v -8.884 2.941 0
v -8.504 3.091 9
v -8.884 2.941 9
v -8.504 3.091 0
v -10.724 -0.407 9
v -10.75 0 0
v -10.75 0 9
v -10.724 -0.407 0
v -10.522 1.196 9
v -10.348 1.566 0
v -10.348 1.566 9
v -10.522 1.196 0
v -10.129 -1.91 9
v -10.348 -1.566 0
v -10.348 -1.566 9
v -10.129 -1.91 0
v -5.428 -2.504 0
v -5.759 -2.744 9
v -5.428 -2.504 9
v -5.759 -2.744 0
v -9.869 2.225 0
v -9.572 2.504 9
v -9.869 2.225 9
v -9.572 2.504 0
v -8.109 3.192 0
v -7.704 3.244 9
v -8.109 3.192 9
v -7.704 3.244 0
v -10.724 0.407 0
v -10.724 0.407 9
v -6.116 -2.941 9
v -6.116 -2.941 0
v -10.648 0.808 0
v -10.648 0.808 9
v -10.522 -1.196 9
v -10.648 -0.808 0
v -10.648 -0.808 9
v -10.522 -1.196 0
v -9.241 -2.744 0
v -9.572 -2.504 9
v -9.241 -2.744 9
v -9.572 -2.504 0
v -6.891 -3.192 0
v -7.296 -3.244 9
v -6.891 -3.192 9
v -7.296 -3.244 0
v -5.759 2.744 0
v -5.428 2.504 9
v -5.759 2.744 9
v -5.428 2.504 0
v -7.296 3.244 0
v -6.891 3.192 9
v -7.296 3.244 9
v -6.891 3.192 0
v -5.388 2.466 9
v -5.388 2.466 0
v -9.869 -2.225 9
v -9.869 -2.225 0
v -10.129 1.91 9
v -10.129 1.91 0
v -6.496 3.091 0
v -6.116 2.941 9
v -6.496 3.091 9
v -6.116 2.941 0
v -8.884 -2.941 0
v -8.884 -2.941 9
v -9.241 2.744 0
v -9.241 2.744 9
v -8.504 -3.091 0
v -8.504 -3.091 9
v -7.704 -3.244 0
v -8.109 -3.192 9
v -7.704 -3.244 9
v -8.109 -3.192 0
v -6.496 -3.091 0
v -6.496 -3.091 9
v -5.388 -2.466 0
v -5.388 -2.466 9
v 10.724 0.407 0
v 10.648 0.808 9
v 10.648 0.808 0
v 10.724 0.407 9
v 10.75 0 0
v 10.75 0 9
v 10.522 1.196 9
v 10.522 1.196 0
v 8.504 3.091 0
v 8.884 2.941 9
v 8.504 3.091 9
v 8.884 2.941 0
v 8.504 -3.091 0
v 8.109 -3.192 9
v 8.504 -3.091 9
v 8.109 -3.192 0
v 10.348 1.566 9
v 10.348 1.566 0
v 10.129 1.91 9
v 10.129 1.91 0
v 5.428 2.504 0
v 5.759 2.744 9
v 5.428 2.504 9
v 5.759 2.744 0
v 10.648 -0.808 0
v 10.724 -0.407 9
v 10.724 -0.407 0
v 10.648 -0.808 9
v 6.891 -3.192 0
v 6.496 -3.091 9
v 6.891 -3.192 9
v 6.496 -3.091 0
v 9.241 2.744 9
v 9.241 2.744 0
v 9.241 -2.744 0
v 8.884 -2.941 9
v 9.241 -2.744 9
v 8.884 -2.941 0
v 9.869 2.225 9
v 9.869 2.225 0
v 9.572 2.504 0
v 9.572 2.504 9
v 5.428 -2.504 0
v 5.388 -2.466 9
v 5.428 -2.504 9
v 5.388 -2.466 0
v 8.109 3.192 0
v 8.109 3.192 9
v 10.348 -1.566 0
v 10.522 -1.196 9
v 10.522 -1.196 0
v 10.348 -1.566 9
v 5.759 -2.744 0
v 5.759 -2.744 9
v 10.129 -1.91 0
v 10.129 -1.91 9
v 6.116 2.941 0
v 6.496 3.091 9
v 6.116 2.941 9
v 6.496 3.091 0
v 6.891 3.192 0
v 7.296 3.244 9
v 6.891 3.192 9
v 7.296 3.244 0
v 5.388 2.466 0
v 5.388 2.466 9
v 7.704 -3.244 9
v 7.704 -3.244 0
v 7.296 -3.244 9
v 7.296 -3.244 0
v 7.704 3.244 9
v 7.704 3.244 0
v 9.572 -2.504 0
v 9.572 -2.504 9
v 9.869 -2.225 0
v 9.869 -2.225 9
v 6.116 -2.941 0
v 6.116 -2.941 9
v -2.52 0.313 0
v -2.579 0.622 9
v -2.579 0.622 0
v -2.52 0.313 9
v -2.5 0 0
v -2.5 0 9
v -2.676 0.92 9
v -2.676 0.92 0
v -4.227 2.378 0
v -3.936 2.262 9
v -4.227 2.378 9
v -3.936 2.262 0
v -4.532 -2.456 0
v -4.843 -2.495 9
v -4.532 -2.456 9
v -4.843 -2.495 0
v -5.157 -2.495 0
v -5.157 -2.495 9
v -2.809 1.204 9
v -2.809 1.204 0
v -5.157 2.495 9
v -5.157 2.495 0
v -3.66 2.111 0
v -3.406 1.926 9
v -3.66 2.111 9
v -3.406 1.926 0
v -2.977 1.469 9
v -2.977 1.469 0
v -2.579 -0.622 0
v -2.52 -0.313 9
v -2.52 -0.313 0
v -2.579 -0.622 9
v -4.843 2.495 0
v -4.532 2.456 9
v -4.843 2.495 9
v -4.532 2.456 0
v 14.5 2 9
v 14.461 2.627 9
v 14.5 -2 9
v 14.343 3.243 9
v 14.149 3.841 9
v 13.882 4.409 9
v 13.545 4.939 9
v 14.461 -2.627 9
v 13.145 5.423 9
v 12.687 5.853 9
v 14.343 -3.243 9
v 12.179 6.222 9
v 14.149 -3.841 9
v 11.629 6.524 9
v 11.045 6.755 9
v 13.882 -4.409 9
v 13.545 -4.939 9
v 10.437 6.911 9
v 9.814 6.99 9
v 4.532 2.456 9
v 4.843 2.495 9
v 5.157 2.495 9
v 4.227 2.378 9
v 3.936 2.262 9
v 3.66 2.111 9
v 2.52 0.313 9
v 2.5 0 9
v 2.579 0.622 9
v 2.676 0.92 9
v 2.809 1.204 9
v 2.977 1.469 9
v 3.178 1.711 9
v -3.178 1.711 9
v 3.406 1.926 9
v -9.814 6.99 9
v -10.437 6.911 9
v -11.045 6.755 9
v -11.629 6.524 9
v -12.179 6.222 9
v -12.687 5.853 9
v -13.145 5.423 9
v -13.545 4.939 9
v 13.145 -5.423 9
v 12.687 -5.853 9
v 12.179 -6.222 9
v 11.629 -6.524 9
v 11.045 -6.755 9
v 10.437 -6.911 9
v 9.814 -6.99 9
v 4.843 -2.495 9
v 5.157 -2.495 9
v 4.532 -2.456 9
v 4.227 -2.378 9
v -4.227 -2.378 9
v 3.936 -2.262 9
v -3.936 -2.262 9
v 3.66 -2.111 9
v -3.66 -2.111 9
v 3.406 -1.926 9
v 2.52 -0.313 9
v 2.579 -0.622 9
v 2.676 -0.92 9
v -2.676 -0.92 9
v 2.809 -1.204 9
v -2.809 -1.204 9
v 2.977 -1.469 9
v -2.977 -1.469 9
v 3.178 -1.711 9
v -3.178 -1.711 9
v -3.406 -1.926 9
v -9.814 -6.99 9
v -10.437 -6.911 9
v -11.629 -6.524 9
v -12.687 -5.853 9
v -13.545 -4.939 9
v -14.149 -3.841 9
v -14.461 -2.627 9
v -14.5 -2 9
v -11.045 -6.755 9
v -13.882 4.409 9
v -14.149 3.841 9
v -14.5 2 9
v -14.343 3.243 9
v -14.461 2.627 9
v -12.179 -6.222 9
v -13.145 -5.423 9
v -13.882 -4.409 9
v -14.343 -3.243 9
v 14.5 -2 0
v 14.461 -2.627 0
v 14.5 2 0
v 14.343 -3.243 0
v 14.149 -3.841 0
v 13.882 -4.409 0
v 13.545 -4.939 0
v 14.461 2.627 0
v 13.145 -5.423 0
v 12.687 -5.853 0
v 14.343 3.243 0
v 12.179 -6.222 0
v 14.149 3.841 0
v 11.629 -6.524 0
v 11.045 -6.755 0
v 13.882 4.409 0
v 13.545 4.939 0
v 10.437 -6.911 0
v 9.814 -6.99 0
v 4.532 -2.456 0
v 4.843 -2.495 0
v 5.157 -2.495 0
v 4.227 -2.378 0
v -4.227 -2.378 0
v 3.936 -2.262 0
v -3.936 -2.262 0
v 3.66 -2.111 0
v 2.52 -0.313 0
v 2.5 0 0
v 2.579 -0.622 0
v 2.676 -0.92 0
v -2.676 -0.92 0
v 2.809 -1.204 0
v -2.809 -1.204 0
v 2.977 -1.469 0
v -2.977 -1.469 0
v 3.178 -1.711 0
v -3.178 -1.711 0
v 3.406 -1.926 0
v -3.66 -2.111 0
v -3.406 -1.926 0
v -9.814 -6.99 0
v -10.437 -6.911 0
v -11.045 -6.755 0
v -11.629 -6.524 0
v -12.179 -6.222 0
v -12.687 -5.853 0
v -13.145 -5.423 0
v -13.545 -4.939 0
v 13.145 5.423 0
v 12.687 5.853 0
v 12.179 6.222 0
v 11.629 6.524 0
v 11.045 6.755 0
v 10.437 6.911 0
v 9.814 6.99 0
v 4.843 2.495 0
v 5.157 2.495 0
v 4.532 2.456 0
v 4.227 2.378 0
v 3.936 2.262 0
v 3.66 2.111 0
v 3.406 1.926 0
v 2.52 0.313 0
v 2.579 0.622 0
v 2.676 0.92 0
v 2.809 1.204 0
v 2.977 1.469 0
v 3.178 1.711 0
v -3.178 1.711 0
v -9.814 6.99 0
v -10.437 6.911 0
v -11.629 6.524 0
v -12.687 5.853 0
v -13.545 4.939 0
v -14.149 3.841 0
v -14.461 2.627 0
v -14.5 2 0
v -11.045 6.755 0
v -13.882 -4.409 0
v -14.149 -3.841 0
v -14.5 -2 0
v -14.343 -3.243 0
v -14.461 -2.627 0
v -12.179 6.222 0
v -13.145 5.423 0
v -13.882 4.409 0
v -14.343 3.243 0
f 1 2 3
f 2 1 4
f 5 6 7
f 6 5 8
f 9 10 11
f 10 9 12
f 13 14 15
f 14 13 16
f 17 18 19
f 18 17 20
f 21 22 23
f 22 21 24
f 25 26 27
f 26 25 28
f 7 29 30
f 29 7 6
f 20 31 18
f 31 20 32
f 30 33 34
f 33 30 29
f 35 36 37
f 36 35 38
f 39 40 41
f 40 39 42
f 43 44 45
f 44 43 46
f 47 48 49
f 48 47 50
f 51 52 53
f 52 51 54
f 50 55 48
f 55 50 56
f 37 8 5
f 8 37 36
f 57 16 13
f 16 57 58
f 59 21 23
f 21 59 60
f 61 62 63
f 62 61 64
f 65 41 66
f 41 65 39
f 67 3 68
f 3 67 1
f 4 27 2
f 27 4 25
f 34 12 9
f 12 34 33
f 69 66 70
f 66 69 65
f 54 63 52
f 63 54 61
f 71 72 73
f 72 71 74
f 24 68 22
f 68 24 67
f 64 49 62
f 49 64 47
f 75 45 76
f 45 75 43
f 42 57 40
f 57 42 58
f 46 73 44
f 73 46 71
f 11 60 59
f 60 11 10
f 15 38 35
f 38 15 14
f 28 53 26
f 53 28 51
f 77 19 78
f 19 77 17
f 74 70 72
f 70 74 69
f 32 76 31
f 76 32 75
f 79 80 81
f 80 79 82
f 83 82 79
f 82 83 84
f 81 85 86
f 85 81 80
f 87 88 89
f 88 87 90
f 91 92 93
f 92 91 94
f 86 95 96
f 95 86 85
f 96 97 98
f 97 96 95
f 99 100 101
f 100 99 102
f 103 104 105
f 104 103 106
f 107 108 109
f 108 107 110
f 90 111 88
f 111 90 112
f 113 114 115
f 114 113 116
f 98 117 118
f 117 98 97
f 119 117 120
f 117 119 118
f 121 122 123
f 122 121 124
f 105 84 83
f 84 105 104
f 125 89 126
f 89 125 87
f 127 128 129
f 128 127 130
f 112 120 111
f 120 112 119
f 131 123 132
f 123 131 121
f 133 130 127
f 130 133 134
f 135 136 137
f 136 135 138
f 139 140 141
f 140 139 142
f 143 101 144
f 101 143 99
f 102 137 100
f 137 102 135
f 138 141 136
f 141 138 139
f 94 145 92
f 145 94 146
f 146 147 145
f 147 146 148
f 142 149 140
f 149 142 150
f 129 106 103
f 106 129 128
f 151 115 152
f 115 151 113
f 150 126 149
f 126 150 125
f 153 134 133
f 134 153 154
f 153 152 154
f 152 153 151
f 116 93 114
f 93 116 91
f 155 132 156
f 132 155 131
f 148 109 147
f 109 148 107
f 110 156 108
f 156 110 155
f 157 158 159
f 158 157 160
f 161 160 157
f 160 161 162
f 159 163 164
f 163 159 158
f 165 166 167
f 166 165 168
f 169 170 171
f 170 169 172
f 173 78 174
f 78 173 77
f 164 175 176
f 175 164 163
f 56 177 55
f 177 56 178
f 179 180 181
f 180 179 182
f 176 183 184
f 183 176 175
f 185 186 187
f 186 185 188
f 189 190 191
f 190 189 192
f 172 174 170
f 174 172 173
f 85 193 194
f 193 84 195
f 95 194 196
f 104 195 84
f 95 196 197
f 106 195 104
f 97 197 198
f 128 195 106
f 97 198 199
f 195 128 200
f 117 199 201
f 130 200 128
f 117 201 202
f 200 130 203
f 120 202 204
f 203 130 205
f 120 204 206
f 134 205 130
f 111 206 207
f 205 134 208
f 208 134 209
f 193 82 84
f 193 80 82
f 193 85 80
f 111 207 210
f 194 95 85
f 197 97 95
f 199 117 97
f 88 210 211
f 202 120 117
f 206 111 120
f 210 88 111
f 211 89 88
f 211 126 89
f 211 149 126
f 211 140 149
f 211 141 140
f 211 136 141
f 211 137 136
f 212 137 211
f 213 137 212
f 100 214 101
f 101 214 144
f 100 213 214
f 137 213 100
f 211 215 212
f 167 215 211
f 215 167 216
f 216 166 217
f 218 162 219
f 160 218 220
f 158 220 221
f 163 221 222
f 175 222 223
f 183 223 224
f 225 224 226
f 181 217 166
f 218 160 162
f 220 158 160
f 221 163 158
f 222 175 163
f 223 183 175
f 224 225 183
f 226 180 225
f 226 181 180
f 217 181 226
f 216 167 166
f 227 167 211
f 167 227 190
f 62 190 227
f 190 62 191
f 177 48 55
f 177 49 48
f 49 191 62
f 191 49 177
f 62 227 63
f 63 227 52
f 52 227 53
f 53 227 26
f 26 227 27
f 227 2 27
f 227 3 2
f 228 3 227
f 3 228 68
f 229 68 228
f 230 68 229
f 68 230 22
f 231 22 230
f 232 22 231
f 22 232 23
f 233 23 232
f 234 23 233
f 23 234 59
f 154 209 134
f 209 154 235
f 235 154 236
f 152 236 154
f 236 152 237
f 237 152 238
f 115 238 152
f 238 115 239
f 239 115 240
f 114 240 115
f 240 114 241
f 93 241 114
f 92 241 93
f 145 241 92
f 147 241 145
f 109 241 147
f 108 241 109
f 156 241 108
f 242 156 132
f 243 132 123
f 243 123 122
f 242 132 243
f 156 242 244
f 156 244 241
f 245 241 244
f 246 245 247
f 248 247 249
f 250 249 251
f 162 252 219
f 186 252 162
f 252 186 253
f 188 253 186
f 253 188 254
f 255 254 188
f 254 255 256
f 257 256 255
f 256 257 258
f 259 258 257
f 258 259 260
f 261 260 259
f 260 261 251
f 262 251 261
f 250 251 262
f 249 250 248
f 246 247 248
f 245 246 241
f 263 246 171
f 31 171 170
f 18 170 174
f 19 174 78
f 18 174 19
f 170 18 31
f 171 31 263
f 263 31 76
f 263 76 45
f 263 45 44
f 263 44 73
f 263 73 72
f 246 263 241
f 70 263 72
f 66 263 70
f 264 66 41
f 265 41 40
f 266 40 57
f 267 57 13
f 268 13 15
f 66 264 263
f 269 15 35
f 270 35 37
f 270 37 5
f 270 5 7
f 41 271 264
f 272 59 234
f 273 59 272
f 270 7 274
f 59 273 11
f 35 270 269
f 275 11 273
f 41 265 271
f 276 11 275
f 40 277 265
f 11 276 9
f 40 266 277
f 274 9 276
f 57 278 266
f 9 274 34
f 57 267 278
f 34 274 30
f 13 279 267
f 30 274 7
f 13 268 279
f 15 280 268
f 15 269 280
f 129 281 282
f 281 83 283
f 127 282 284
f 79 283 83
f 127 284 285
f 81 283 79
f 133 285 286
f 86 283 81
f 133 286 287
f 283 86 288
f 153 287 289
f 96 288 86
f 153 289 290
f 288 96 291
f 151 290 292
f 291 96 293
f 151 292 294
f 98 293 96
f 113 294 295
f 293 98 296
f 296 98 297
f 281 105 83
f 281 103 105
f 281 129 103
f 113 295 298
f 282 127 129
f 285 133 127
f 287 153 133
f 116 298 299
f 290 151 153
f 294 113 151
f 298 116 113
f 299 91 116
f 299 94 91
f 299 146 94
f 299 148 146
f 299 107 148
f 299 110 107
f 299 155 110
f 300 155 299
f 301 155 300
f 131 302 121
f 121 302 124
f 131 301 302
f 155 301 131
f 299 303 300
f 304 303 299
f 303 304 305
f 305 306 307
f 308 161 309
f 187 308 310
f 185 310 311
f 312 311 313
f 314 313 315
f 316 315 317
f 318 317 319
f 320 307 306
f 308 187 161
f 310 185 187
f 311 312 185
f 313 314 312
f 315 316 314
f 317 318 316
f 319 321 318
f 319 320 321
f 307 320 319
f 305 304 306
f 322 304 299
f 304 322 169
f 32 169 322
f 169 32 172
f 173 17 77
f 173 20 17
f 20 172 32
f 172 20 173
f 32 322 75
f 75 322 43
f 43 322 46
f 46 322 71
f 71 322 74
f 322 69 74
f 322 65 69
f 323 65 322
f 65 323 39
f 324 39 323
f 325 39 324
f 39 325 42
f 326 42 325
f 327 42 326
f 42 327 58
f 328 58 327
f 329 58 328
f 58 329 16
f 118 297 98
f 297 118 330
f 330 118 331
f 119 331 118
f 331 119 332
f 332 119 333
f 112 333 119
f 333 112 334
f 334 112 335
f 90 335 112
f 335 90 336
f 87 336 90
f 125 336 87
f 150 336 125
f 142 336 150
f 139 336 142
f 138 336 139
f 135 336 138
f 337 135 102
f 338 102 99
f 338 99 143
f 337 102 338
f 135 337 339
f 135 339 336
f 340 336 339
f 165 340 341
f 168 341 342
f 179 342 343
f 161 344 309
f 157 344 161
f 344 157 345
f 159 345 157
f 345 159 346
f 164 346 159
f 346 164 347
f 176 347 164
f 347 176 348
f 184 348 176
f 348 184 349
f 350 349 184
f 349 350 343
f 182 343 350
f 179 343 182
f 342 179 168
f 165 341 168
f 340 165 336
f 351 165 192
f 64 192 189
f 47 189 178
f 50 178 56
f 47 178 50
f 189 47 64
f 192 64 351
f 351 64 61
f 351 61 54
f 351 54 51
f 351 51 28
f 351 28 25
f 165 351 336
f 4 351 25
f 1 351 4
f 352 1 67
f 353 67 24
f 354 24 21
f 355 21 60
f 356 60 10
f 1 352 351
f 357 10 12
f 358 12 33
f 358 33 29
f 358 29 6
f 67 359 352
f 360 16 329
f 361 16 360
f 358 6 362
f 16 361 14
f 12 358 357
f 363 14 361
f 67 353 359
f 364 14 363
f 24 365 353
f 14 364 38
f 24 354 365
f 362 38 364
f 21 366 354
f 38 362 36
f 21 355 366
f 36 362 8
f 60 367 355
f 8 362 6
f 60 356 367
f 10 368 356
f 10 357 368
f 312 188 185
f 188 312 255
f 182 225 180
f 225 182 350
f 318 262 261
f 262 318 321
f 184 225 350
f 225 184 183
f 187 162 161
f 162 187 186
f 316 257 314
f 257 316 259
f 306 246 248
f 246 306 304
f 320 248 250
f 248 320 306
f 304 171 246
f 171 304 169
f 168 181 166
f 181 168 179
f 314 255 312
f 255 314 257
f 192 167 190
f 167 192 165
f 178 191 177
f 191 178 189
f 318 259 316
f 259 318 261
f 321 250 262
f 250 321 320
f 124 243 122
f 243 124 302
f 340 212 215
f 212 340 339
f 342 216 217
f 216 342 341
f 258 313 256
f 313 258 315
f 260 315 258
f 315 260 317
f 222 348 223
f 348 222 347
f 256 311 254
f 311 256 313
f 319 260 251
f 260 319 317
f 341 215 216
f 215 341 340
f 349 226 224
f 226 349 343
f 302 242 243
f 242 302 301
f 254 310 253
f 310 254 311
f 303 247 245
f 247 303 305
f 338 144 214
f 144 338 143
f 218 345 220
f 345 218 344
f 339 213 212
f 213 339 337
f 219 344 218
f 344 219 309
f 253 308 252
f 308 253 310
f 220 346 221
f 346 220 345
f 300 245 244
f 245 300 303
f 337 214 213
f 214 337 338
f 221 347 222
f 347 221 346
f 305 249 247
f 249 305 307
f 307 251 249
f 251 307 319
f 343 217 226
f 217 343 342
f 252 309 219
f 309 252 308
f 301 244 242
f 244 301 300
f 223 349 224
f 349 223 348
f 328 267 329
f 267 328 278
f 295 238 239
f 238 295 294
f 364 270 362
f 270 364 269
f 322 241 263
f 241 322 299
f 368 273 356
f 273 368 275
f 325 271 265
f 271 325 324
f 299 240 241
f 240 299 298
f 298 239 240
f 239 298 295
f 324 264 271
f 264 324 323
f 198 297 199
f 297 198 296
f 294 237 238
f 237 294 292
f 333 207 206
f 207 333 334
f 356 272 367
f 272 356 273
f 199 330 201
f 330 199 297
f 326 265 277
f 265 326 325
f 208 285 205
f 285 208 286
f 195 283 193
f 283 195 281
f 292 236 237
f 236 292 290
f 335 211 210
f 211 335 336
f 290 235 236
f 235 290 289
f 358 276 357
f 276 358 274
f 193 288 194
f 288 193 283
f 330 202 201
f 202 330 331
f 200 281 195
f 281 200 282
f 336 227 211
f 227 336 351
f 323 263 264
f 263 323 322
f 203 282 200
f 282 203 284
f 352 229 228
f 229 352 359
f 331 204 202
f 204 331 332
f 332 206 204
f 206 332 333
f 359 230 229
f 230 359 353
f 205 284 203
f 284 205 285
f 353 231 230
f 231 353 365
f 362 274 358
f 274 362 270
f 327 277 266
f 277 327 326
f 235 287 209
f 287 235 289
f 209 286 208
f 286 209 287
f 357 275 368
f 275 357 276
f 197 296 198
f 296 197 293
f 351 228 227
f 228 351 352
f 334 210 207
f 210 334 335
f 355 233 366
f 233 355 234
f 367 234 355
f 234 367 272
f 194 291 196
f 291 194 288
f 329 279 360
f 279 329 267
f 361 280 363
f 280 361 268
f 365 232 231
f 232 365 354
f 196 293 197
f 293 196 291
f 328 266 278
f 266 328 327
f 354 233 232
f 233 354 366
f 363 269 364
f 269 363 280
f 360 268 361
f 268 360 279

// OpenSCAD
$fn = 50;


difference() {
	union() {
		hull() {
			translate(v = [-9.5000000000, 2.0000000000, 0]) {
				cylinder(h = 9, r = 5);
			}
			translate(v = [9.5000000000, 2.0000000000, 0]) {
				cylinder(h = 9, r = 5);
			}
			translate(v = [-9.5000000000, -2.0000000000, 0]) {
				cylinder(h = 9, r = 5);
			}
			translate(v = [9.5000000000, -2.0000000000, 0]) {
				cylinder(h = 9, r = 5);
			}
		}
	}
	union() {
		#translate(v = [-7.5000000000, 0.0000000000, -100.0000000000]) {
			cylinder(h = 200, r = 3.2500000000);
		}
		#translate(v = [-7.5000000000, 0.0000000000, -100.0000000000]) {
			cylinder(h = 200, r = 3.2500000000);
		}
		#translate(v = [7.5000000000, 0.0000000000, -100.0000000000]) {
			cylinder(h = 200, r = 3.2500000000);
		}
		#translate(v = [7.5000000000, 0.0000000000, -100.0000000000]) {
			cylinder(h = 200, r = 3.2500000000);
		}
		#translate(v = [-5.0000000000, 0, 0]) {
			cylinder(h = 9, r = 2.5000000000);
		}
		#translate(v = [5.0000000000, 0, 0]) {
			cylinder(h = 9, r = 2.5000000000);
		}
	}
}
